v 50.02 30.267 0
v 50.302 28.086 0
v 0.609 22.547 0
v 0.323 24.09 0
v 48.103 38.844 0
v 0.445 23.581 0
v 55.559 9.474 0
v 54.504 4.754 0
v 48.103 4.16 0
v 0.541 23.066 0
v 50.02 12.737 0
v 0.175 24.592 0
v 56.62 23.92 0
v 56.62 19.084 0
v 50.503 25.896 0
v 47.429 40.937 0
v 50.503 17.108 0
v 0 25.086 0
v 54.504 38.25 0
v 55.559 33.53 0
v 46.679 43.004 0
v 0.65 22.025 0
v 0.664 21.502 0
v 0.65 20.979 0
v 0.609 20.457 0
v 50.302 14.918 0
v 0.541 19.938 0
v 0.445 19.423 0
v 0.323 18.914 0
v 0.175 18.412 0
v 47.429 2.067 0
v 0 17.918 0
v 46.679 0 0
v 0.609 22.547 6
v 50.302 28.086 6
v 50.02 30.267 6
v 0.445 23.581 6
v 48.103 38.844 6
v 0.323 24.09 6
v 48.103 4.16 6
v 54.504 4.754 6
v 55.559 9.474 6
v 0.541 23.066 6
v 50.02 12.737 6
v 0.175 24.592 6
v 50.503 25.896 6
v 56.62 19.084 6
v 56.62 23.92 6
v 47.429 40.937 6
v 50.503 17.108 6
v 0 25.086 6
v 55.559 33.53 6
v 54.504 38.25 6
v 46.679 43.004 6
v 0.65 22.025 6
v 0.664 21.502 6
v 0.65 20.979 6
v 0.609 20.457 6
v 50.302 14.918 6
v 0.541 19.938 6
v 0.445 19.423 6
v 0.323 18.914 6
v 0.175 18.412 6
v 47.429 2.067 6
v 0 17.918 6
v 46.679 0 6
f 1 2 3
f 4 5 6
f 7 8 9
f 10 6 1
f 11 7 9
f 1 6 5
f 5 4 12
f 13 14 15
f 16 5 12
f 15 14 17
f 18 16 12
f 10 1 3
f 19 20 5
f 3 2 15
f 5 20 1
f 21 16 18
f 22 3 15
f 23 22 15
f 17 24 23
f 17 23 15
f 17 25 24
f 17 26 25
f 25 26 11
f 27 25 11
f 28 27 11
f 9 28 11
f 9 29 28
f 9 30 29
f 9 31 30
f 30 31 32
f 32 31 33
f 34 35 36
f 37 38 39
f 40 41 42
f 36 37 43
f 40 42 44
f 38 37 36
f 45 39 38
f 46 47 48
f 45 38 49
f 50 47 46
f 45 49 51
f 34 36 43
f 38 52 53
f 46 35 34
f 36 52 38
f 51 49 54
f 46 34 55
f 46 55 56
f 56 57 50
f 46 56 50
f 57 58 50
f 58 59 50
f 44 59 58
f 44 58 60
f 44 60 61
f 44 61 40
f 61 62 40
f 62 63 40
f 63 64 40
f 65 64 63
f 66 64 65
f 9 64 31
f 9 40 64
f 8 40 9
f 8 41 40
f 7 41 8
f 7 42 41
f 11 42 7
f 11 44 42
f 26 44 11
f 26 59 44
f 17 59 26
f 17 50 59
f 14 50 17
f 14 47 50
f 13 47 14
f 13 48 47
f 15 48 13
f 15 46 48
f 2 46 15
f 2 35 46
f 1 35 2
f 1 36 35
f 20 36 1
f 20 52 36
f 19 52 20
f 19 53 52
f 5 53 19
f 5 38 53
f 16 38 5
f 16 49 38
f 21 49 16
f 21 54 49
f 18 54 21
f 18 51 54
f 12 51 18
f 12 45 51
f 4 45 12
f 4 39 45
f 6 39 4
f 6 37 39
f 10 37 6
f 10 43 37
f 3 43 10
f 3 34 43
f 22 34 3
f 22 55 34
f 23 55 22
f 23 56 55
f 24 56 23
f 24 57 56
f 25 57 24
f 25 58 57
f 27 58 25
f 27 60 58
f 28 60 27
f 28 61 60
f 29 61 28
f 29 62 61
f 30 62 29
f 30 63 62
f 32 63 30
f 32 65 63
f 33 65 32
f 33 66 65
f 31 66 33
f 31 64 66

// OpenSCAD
$fn = 32;

// ----------------------------------------------------------------------
// Gear sector: 3 teeth on 42 degrees
// ----------------------------------------------------------------------

// --- parameters (mm) ---
sector_angle = 42;        // sector angle, degrees
root_r = 60;              // root circle radius
tooth_h = 6;              // tooth height over the root circle
teeth = 3;                // number of teeth on the sector
hub_r = 10;               // hub bore radius
plate_t = 6;              // sector thickness, Z
arc_step = 3;             // sampling step of the root/hub arcs, degrees
fit_tol = 0.1;            // declared fit tolerance (prompt contract)
free_tol = 0.3;           // declared free tolerance (prompt contract)

tip_r = root_r + tooth_h;  // tip circle radius

profile = [[46.679, 0], [47.429, 2.067], [48.103, 4.16], [54.504, 4.754], [55.559, 9.474], [50.02, 12.737], [50.302, 14.918], [50.503, 17.108], [56.62, 19.084], [56.62, 23.92], [50.503, 25.896], [50.302, 28.086], [50.02, 30.267], [55.559, 33.53], [54.504, 38.25], [48.103, 38.844], [47.429, 40.937], [46.679, 43.004], [0, 25.086], [0.175, 24.592], [0.323, 24.09], [0.445, 23.581], [0.541, 23.066], [0.609, 22.547], [0.65, 22.025], [0.664, 21.502], [0.65, 20.979], [0.609, 20.457], [0.541, 19.938], [0.445, 19.423], [0.323, 18.914], [0.175, 18.412], [0, 17.918]];  // primary outline, 33 points, counter clockwise

// --- the one profile operation ---
linear_extrude(height = plate_t) polygon(points = profile);
